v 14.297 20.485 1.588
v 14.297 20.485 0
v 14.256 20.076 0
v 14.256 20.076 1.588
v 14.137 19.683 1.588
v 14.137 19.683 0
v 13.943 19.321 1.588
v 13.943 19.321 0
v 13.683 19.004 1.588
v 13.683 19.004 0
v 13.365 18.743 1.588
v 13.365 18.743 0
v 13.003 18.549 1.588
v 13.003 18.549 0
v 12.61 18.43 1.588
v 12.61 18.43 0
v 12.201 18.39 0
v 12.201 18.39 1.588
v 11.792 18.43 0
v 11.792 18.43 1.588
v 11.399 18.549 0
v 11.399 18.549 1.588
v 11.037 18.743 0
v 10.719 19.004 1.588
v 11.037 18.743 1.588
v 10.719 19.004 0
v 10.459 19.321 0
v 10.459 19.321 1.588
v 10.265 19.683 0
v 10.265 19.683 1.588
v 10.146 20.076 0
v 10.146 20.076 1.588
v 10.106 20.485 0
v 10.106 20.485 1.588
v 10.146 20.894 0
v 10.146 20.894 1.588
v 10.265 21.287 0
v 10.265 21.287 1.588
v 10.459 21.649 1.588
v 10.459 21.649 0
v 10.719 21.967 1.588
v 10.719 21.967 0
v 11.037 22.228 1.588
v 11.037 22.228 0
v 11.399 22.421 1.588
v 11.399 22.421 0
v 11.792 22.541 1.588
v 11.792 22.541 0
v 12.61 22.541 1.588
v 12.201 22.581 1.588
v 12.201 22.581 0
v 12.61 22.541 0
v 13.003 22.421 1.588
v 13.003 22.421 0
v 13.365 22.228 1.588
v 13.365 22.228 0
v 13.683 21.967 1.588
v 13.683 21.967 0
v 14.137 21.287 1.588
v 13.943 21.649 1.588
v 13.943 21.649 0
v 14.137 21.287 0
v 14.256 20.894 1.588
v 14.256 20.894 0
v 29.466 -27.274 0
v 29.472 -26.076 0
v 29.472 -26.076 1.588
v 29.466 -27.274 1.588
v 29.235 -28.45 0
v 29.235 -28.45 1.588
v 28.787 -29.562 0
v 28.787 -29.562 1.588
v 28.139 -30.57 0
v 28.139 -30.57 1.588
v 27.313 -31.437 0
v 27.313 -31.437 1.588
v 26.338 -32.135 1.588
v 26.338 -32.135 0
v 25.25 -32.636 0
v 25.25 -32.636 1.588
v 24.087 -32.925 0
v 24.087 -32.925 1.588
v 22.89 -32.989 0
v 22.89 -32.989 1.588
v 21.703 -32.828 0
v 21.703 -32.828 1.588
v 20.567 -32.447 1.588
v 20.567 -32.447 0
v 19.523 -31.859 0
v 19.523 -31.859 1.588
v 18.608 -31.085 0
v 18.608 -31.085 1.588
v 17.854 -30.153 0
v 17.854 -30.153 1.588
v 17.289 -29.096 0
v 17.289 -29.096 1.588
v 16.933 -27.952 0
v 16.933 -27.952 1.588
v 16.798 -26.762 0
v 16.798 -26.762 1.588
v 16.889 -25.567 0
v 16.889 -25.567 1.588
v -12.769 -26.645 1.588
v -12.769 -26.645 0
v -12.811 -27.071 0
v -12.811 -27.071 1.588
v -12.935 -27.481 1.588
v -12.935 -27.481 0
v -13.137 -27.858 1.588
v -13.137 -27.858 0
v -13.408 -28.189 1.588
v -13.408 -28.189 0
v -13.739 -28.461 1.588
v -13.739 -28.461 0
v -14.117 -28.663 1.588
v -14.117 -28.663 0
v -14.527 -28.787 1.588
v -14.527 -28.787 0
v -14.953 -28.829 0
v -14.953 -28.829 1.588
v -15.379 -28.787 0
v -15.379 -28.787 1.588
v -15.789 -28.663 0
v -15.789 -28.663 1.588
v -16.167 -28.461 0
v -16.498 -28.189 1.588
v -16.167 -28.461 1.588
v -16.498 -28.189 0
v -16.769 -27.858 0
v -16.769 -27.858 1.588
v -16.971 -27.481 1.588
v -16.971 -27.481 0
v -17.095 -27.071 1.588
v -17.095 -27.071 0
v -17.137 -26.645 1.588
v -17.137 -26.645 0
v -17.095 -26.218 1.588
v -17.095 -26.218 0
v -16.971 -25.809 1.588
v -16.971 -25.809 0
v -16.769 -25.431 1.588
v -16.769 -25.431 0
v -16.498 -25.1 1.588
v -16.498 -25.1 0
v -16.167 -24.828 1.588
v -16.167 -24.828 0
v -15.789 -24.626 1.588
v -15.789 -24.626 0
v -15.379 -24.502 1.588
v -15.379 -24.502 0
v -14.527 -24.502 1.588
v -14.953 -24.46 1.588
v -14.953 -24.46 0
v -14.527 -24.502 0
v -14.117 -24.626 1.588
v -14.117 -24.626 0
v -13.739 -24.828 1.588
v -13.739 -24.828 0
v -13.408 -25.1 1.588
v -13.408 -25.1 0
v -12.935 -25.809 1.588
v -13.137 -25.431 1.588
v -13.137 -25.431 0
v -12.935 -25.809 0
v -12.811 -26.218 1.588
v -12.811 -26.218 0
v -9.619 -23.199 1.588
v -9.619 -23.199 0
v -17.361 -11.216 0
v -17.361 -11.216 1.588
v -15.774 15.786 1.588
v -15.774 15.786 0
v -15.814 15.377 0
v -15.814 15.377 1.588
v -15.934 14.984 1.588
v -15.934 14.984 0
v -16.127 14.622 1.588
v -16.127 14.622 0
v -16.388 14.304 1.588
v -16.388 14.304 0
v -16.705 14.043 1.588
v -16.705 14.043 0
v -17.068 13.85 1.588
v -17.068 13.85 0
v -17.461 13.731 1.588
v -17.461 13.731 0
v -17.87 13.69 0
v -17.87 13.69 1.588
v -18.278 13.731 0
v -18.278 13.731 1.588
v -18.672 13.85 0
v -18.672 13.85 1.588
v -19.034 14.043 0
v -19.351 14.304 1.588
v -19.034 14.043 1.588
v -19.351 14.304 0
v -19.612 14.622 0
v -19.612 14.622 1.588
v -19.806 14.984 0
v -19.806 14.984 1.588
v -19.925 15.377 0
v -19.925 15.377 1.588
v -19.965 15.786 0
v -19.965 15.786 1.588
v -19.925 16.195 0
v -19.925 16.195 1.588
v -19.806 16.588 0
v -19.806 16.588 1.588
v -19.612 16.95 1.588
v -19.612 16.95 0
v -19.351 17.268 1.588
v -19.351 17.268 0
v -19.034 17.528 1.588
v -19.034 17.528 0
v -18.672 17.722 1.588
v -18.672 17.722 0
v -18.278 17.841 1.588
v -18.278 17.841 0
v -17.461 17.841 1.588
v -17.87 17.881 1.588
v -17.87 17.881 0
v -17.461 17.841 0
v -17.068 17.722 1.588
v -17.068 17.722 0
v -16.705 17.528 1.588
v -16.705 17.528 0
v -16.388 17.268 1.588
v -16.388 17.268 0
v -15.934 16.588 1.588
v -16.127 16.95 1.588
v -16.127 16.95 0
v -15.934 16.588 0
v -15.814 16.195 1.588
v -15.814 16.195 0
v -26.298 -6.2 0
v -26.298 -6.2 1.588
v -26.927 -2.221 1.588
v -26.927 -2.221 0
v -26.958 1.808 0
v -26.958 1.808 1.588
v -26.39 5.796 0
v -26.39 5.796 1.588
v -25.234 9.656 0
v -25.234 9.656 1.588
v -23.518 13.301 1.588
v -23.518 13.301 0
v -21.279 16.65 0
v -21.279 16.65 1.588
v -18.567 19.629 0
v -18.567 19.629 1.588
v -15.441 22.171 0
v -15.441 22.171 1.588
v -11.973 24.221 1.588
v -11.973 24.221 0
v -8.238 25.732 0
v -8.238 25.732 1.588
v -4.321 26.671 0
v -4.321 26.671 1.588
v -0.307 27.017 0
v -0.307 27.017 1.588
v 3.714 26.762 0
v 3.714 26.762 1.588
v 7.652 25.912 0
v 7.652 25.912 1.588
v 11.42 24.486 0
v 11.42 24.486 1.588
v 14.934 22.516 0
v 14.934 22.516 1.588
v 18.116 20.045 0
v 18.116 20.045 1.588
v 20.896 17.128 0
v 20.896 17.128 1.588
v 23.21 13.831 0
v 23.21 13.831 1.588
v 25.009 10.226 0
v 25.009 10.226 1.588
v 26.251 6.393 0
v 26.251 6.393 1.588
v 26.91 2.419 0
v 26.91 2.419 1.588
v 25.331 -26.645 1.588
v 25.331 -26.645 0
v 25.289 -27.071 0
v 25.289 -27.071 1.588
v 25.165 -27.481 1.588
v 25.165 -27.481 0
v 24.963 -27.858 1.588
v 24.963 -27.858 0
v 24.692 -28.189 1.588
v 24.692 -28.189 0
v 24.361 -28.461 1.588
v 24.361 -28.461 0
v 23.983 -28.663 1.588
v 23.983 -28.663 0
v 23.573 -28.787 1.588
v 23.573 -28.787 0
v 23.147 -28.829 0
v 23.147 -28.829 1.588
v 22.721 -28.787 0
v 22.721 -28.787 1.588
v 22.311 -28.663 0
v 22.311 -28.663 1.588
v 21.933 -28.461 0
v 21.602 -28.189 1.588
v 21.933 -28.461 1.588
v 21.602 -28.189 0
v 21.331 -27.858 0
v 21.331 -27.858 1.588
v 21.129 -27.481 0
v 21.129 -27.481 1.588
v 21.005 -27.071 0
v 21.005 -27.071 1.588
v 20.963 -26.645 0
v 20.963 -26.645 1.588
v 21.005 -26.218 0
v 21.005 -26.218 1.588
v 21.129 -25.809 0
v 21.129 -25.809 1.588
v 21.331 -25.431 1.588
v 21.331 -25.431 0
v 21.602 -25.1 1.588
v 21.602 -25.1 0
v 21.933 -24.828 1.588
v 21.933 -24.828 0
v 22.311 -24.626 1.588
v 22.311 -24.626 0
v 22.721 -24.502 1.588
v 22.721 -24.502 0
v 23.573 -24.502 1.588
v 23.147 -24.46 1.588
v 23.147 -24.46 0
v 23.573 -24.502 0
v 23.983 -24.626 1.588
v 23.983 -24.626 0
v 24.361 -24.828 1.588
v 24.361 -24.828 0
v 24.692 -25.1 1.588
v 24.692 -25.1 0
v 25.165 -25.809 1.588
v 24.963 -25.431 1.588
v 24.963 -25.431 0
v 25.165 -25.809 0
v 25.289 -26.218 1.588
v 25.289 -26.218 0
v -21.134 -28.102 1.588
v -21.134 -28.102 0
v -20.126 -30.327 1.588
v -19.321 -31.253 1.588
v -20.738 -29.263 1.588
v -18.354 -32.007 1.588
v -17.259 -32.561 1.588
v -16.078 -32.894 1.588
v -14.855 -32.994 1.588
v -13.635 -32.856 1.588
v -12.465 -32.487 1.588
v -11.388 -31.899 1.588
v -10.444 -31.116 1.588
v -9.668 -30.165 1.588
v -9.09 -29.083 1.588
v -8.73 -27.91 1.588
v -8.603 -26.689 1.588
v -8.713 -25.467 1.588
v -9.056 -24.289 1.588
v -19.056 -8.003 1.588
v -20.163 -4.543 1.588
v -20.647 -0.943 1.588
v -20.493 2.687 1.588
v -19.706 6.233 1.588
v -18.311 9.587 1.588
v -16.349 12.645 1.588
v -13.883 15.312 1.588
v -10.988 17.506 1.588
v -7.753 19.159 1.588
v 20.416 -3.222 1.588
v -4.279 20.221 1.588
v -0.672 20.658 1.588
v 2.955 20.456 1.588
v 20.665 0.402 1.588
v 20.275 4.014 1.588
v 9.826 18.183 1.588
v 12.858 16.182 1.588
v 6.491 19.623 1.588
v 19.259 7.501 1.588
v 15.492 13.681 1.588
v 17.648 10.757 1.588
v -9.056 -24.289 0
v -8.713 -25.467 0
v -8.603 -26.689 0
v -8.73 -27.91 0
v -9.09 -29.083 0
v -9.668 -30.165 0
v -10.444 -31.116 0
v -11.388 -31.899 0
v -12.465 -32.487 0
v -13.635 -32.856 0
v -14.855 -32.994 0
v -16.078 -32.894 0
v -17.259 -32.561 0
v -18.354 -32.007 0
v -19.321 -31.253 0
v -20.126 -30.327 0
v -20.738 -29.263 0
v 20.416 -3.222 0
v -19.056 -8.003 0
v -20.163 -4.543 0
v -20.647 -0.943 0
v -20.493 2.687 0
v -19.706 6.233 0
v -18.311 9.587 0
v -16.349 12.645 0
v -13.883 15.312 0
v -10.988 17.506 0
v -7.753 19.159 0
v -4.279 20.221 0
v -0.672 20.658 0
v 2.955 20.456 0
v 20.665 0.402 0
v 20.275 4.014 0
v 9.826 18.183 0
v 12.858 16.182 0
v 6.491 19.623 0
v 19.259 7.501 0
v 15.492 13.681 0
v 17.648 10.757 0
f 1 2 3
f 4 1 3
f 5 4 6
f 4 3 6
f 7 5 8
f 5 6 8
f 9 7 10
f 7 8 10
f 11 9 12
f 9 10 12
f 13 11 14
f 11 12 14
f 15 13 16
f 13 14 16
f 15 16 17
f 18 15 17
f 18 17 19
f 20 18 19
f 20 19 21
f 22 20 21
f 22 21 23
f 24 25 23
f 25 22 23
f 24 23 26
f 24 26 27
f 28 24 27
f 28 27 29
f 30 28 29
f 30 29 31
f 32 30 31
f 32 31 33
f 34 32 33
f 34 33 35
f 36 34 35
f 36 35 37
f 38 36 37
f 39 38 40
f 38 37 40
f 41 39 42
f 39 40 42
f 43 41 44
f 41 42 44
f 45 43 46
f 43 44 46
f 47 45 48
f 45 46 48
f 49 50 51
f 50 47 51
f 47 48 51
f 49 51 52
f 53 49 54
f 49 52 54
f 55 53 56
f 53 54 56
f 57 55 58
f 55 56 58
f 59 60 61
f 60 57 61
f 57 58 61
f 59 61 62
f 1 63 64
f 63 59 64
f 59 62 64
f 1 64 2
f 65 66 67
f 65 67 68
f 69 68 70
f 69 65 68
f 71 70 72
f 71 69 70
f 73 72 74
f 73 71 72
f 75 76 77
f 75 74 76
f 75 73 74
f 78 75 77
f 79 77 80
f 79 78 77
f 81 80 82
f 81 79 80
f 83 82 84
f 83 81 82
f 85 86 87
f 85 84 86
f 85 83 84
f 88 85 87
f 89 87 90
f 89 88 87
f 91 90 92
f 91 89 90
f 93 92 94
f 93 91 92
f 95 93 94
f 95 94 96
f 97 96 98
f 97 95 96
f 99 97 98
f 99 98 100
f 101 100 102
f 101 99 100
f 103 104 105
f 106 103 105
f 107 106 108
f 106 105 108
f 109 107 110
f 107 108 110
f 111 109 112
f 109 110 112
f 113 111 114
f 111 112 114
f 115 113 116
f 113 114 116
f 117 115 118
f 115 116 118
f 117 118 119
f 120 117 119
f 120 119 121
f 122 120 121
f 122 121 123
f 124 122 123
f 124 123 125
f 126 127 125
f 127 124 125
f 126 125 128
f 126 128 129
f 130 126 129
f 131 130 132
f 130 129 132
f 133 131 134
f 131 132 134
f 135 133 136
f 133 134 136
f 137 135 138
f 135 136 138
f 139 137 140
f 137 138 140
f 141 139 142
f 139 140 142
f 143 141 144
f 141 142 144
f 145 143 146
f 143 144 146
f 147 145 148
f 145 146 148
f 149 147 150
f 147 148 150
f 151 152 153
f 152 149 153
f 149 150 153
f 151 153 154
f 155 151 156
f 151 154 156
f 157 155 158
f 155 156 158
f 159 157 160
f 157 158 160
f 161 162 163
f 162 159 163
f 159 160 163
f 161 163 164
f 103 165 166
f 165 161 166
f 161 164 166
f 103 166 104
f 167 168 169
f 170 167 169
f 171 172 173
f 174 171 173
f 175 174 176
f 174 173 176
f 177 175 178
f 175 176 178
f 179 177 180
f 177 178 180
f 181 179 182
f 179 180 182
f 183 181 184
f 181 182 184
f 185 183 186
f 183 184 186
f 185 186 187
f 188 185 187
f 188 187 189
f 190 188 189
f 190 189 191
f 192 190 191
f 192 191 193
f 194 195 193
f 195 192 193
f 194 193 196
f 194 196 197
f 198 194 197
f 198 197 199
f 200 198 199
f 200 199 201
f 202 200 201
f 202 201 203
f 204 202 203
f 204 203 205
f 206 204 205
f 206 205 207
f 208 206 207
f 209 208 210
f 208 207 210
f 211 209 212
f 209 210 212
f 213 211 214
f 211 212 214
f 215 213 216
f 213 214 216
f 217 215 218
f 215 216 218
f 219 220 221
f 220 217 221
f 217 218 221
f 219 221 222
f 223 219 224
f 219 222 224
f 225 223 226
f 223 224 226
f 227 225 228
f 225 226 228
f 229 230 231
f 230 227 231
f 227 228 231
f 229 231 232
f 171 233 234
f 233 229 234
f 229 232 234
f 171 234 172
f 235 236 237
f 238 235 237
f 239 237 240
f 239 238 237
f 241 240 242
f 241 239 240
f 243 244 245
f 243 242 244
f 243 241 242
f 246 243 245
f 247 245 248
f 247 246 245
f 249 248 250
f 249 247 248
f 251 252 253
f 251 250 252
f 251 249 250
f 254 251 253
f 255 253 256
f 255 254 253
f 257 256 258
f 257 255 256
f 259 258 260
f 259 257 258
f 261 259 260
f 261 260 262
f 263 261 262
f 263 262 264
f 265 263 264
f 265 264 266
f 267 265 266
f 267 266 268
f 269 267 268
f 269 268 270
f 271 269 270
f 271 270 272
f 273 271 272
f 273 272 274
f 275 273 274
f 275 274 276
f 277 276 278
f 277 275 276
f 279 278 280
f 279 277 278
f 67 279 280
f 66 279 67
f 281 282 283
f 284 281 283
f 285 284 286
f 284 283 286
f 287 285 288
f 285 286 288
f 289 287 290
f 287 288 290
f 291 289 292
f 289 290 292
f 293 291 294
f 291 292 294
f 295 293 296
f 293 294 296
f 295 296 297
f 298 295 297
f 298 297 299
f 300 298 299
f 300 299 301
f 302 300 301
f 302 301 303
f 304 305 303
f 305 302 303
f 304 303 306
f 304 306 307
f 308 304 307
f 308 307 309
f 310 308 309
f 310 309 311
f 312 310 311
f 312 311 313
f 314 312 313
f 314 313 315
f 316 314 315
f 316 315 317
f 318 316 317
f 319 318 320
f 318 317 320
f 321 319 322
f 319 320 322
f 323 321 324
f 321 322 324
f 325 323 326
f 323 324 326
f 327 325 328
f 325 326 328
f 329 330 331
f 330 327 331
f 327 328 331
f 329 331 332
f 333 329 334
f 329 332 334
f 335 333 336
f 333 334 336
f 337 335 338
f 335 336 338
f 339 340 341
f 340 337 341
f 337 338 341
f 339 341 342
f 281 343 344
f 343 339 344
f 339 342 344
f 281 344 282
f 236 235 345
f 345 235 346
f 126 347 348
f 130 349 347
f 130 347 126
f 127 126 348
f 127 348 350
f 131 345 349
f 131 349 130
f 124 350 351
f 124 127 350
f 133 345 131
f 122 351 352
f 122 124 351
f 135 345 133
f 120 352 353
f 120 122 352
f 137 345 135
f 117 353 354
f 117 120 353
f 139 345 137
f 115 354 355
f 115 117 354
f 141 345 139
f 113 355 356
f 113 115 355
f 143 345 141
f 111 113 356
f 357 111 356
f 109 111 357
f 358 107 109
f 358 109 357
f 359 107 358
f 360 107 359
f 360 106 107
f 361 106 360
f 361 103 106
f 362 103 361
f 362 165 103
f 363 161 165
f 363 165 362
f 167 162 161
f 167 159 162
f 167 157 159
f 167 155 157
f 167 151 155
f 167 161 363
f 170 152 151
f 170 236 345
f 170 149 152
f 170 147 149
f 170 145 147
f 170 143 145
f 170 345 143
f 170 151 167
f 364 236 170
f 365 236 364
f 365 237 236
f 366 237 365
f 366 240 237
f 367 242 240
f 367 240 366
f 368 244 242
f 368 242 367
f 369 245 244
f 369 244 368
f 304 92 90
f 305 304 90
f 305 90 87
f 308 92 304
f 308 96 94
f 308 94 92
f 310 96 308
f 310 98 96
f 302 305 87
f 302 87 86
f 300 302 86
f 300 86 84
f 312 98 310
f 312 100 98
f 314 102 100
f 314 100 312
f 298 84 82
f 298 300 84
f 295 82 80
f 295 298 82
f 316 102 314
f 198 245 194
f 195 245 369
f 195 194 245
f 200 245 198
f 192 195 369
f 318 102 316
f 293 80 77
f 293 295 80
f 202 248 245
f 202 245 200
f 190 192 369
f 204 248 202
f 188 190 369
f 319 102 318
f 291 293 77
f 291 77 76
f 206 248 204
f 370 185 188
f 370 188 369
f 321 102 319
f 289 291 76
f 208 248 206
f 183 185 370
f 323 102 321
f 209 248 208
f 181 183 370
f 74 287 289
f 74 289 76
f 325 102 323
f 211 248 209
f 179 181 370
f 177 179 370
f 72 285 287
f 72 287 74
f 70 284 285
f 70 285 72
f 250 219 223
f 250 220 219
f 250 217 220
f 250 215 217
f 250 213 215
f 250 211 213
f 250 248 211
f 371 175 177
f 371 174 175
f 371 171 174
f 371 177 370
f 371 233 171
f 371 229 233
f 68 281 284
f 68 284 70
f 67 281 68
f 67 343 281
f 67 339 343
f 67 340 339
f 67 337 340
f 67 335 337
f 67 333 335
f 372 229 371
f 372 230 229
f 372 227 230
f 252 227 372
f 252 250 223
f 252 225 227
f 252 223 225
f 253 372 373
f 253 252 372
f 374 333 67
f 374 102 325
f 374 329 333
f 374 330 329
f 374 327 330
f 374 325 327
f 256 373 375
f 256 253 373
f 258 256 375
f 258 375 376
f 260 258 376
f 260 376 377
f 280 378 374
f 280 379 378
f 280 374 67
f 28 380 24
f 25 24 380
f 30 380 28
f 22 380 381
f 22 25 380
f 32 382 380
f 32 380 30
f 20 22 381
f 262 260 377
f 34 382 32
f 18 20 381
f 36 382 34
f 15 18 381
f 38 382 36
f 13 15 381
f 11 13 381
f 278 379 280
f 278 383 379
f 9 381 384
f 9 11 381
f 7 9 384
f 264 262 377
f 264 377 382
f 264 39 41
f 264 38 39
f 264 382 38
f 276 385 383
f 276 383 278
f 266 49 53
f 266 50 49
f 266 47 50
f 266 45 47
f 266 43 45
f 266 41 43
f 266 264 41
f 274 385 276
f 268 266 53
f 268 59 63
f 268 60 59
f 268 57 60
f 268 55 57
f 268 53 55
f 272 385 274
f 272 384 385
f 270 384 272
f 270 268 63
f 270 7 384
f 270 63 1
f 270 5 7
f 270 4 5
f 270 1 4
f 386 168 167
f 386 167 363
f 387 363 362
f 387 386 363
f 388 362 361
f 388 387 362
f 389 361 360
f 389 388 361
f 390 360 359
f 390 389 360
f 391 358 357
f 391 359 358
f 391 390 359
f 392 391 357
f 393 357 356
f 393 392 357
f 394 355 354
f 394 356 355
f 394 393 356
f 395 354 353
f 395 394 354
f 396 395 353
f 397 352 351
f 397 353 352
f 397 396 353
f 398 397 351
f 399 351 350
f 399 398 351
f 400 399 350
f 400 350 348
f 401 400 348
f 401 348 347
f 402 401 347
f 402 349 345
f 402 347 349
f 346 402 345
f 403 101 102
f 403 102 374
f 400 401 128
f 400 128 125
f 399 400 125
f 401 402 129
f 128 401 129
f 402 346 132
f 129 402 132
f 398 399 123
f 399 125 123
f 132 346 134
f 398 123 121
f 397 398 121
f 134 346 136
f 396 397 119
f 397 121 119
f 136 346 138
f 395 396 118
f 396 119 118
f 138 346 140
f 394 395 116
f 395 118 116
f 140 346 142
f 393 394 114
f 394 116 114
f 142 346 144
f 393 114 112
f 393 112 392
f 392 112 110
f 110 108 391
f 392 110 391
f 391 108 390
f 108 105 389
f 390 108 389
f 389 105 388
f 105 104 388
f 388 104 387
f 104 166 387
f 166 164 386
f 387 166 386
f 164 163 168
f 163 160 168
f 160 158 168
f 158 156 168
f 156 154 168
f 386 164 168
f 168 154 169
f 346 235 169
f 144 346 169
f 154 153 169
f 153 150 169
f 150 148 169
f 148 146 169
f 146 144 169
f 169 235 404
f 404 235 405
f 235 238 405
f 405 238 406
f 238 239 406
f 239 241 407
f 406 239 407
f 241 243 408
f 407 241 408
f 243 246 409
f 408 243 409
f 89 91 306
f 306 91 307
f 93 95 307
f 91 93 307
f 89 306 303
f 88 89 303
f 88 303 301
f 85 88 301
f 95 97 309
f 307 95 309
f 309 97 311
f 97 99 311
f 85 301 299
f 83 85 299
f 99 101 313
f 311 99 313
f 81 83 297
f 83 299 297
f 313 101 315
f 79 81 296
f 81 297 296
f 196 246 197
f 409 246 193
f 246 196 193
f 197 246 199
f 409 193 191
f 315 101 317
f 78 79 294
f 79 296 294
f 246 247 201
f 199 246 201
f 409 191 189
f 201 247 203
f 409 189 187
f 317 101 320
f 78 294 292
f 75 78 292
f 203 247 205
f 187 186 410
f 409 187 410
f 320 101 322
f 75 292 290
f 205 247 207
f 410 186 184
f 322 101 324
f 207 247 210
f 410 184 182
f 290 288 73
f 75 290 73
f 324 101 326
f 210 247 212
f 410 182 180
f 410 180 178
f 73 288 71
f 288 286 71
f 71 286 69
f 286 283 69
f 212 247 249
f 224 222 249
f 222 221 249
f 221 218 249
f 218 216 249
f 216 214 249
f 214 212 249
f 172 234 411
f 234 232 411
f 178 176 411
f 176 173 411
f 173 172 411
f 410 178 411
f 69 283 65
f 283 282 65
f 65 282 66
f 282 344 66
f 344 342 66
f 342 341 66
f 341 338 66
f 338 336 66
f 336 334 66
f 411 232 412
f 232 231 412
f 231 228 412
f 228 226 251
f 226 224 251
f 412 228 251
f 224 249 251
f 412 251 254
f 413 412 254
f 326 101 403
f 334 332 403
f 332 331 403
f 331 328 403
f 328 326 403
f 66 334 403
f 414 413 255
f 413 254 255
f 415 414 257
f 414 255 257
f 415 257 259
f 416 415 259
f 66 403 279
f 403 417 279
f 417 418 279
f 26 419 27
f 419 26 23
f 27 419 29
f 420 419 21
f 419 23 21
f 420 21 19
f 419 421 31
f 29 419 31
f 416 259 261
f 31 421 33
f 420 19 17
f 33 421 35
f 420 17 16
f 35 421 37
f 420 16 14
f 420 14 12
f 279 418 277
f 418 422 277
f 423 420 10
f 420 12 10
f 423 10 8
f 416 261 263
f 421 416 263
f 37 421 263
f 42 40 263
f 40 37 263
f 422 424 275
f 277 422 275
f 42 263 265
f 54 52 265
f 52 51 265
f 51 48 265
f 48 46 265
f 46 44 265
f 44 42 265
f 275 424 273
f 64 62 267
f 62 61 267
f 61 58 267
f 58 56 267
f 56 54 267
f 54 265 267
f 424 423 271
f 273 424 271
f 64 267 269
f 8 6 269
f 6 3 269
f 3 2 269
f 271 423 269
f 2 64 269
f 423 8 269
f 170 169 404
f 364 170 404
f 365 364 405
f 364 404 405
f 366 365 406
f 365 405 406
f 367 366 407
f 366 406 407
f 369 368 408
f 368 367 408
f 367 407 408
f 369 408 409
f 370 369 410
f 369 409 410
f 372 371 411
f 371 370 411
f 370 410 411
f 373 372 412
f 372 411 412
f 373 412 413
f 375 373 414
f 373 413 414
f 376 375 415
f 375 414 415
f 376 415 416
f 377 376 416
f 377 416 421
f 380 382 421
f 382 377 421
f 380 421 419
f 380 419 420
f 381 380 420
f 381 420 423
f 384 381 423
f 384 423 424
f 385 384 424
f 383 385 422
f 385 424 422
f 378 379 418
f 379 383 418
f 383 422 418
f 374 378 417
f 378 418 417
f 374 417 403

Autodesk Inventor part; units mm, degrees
ref_plane "YZ Plane" through (0, 0, 0) normal (1, 0, 0) x (0, 1, 0)
ref_plane "XZ Plane" through (0, 0, 0) normal (0, 1, 0) x (-1, 0, 0)
ref_plane "XY Plane" through (0, 0, 0) normal (0, 0, 1) x (1, 0, 0)
sketch "main" plane through (0, 0, 0) normal (0, 0, 1) x (1, 0, 0)
  circle A0 centre (-12.7091, -24.4332) radius 2.1844
  circle A1 centre (25.3909, -24.4332) radius 2.1844
  arc A2 (19.133, -23.3552) -> (31.7154, -23.8647) centre (25.3909, -24.4332) ccw
  arc A3 (-18.8897, -25.8904) -> (-7.3754, -20.9874) centre (-12.7091, -24.4332) ccw
  arc A4 (29.1539, 4.6304) -> (-24.0536, -3.989) centre (2.2439, 2.2114) ccw
  line L0 (29.1539, 4.6304) -> (31.7154, -23.8647)
  line L1 (-24.0536, -3.989) -> (-18.8897, -25.8904)
  arc A5 (22.6597, -1.0109) -> (-15.1169, -9.0043) centre (2.2439, 2.2114) ccw
  line L2 (19.133, -23.3552) -> (22.6597, -1.0109)
  line L3 (-7.3754, -20.9874) -> (-15.1169, -9.0043)
  circle A6 centre (-15.6258, 17.9972) radius 2.0955
  circle A7 centre (14.445, 22.6967) radius 2.0955
  point P0 (4.9022, -14.671)
  dimension "d0" = 12.7
  dimension "d1" = 12.7
  dimension "d2" = 6.35
  dimension "d5" = 4.191
  dimension "d6" = 23.8436
  dimension "d7" = 4.191
  dimension "d8" = 23.8436
sketch "Sketch1" plane through (0, 0, 0) normal (0, 0, 1) x (1, 0, 0)
  circle A0 centre (-14.953, -26.6446) radius 2.1844
  circle A1 centre (23.147, -26.6446) radius 2.1844
  arc A2 (16.8891, -25.5667) -> (29.4715, -26.0761) centre (23.147, -26.6446) ccw
  arc A3 (-21.1336, -28.1018) -> (-9.6193, -23.1988) centre (-14.953, -26.6446) ccw
  arc A4 (26.9101, 2.4189) -> (-26.2975, -6.2004) centre (0, 0) ccw
  line L0 (26.9101, 2.4189) -> (29.4715, -26.0761)
  line L1 (-26.2975, -6.2004) -> (-21.1336, -28.1018)
  arc A5 (20.4158, -3.2223) -> (-17.3608, -11.2157) centre (0, 0) ccw
  line L2 (16.8891, -25.5667) -> (20.4158, -3.2223)
  line L3 (-9.6193, -23.1988) -> (-17.3608, -11.2157)
  circle A6 centre (-17.8696, 15.7858) radius 2.0955
  circle A7 centre (12.2011, 20.4853) radius 2.0955
extrude "Extrusion1" add sketch "Sketch1" along normal blind 1.5875
properties part number "Reservoir Mount"
